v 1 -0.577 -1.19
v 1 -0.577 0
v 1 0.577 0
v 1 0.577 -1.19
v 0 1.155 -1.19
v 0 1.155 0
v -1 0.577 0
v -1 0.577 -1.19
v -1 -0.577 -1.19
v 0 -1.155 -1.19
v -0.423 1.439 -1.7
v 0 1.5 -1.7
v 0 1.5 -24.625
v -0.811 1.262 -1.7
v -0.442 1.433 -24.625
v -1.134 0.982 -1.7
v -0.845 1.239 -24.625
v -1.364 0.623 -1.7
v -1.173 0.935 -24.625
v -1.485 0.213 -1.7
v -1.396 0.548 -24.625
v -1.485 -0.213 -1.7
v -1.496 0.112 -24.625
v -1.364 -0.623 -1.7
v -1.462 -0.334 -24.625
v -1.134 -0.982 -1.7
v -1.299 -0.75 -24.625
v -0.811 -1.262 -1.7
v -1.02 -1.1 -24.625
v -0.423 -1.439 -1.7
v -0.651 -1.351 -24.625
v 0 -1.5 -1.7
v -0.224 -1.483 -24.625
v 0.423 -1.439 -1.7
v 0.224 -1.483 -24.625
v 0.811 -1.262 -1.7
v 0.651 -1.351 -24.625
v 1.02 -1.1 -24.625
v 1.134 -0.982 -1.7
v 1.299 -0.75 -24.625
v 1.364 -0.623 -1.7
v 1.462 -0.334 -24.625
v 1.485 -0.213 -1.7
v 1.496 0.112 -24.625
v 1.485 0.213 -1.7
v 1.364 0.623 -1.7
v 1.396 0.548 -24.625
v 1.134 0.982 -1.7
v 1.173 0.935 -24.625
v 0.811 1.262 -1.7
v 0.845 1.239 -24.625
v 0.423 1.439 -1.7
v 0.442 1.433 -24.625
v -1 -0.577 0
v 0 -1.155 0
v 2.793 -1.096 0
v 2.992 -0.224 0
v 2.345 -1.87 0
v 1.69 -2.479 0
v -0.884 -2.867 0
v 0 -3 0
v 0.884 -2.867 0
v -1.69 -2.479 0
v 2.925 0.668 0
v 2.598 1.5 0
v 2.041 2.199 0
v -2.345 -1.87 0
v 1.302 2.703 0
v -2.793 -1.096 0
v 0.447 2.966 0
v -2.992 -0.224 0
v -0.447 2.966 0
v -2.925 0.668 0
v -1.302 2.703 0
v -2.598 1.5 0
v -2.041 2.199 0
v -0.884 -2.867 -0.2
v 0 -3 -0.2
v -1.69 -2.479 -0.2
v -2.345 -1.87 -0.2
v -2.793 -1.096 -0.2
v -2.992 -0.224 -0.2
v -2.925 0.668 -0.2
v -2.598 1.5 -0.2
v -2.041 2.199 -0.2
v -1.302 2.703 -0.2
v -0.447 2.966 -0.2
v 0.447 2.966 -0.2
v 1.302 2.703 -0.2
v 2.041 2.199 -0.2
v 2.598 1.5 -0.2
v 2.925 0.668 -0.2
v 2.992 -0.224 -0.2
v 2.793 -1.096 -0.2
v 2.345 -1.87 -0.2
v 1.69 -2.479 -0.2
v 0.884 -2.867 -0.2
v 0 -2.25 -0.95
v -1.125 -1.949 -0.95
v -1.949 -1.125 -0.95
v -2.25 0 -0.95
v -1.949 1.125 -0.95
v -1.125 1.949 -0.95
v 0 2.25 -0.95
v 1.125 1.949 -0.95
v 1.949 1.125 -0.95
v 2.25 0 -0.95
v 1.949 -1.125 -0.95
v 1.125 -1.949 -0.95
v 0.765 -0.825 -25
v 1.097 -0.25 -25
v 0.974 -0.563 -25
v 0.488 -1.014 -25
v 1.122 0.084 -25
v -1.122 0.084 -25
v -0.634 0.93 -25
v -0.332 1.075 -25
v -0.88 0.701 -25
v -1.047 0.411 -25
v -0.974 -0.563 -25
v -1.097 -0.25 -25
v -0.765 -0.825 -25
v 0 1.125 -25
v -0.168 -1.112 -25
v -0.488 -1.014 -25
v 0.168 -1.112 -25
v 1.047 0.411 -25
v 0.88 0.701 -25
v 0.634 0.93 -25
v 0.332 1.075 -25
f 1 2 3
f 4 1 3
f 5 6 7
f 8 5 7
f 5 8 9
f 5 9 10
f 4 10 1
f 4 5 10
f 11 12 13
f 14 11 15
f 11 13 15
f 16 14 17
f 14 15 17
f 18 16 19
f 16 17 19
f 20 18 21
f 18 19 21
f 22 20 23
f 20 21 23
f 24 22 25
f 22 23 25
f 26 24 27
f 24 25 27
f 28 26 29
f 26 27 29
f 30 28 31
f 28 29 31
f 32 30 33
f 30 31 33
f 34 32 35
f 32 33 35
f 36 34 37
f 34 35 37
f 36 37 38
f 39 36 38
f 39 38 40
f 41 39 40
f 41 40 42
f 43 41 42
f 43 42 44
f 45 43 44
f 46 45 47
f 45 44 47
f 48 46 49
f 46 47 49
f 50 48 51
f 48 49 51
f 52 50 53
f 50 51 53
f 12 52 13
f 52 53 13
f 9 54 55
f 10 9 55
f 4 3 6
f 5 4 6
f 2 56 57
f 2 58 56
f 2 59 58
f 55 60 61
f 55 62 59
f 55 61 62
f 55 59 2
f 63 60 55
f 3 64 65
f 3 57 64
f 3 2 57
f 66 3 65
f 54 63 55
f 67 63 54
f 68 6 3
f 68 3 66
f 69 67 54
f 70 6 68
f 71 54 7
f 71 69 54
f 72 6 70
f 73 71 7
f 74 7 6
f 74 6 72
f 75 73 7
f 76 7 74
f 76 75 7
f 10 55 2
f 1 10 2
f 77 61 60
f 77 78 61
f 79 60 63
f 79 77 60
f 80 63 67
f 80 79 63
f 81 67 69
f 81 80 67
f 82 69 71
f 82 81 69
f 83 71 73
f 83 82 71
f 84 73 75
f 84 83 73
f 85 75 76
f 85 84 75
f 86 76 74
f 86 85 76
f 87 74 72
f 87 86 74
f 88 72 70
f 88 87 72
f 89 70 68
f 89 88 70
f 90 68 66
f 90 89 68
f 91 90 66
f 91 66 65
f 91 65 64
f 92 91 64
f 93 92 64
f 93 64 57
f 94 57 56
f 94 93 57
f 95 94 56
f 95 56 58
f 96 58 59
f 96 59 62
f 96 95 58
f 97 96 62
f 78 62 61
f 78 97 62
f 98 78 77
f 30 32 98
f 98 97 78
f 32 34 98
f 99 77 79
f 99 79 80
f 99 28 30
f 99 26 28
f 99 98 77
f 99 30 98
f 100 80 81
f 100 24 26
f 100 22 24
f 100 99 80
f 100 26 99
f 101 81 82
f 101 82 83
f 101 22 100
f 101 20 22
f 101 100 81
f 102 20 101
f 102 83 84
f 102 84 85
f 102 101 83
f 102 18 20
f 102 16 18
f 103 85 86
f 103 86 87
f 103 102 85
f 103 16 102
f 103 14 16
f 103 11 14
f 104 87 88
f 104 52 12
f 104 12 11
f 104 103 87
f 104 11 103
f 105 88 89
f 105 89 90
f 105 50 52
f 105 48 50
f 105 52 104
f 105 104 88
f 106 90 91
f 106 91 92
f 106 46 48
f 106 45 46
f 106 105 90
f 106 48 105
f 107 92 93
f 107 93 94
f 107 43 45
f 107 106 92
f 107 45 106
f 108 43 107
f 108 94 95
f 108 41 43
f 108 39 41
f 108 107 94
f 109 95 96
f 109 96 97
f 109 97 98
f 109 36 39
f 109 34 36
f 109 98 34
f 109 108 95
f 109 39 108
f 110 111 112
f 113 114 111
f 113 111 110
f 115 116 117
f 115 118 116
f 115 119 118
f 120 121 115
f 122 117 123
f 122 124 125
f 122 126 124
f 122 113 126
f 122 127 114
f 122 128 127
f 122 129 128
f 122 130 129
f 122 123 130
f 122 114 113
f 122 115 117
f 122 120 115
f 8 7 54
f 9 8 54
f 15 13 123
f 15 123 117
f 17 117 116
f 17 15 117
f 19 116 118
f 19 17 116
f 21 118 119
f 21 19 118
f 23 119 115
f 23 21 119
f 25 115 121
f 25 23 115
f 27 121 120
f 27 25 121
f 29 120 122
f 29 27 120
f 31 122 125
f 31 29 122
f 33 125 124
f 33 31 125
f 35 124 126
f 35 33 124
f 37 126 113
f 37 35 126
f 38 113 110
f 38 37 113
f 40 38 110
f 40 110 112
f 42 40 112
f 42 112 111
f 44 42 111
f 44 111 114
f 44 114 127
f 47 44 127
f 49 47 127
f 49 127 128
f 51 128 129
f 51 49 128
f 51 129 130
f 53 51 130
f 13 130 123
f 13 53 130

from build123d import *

# Parameters (mm, degrees)
SKETCH1_W          = 25
SKETCH1_H          = 1.5
CHAMFER1_SIZE      = 0.375
CUT_EXTRUDE2_DEPTH = 1.19


with BuildPart() as part:
    # Sketch1 → Revolve1 (revolve)
    with BuildSketch(Plane(origin=(0, 0, 0), x_dir=(0, 0, -1), z_dir=(1, 0, 0))):
        with Locations((12.5, 0.75)):
            Rectangle(SKETCH1_W, SKETCH1_H)
    revolve(axis=Axis((0, 0, -25), (0, 0, 1)))

    # Chamfer1
    chamfer1_edges = [part.edges().sort_by_distance(p)[0] for p in [
        (0, -1.5, -25),
    ]]
    chamfer(chamfer1_edges, length=CHAMFER1_SIZE)

    # Sketch7 → Revolve2 (revolve)
    with BuildSketch(Plane(origin=(0, 0, 0), x_dir=(0, 0, -1), z_dir=(1, 0, 0)), mode=Mode.PRIVATE) as revolve2_sk:
        Polygon((0, 3), (0.2, 3), (1.7, 1.5), (1.7, 0), (0, 0), align=None)
    revolve(revolve2_sk.sketch.rotate(Axis((0, 0, 0), (0, 0, -1)), 180), axis=Axis((0, 0, 0), (0, 0, -1)))

    # Boss-Extrude1 cone 1 section (through the dimple's axis) → Boss-Extrude1 (revolve)
    with BuildSketch(Plane(origin=(0, 0, -1.7), x_dir=(0, -1, 0), z_dir=(1, 0, 0))):
        Polygon((0, 0), (1.5, 0), (0, 1.5), align=None)
    revolve(axis=Axis((0, 0, -1.7), (0, 0, -1)))

    # Sketch5 → Cut-Extrude2 (cut)
    with BuildSketch(Plane.XY):
        Polygon((1, -0.577350269), (1, 0.577350269), (0, 1.154700538), (-1, 0.577350269), (-1, -0.577350269), (0, -1.154700538), align=None)
    extrude(amount=-CUT_EXTRUDE2_DEPTH, mode=Mode.SUBTRACT)


solid = part.part
